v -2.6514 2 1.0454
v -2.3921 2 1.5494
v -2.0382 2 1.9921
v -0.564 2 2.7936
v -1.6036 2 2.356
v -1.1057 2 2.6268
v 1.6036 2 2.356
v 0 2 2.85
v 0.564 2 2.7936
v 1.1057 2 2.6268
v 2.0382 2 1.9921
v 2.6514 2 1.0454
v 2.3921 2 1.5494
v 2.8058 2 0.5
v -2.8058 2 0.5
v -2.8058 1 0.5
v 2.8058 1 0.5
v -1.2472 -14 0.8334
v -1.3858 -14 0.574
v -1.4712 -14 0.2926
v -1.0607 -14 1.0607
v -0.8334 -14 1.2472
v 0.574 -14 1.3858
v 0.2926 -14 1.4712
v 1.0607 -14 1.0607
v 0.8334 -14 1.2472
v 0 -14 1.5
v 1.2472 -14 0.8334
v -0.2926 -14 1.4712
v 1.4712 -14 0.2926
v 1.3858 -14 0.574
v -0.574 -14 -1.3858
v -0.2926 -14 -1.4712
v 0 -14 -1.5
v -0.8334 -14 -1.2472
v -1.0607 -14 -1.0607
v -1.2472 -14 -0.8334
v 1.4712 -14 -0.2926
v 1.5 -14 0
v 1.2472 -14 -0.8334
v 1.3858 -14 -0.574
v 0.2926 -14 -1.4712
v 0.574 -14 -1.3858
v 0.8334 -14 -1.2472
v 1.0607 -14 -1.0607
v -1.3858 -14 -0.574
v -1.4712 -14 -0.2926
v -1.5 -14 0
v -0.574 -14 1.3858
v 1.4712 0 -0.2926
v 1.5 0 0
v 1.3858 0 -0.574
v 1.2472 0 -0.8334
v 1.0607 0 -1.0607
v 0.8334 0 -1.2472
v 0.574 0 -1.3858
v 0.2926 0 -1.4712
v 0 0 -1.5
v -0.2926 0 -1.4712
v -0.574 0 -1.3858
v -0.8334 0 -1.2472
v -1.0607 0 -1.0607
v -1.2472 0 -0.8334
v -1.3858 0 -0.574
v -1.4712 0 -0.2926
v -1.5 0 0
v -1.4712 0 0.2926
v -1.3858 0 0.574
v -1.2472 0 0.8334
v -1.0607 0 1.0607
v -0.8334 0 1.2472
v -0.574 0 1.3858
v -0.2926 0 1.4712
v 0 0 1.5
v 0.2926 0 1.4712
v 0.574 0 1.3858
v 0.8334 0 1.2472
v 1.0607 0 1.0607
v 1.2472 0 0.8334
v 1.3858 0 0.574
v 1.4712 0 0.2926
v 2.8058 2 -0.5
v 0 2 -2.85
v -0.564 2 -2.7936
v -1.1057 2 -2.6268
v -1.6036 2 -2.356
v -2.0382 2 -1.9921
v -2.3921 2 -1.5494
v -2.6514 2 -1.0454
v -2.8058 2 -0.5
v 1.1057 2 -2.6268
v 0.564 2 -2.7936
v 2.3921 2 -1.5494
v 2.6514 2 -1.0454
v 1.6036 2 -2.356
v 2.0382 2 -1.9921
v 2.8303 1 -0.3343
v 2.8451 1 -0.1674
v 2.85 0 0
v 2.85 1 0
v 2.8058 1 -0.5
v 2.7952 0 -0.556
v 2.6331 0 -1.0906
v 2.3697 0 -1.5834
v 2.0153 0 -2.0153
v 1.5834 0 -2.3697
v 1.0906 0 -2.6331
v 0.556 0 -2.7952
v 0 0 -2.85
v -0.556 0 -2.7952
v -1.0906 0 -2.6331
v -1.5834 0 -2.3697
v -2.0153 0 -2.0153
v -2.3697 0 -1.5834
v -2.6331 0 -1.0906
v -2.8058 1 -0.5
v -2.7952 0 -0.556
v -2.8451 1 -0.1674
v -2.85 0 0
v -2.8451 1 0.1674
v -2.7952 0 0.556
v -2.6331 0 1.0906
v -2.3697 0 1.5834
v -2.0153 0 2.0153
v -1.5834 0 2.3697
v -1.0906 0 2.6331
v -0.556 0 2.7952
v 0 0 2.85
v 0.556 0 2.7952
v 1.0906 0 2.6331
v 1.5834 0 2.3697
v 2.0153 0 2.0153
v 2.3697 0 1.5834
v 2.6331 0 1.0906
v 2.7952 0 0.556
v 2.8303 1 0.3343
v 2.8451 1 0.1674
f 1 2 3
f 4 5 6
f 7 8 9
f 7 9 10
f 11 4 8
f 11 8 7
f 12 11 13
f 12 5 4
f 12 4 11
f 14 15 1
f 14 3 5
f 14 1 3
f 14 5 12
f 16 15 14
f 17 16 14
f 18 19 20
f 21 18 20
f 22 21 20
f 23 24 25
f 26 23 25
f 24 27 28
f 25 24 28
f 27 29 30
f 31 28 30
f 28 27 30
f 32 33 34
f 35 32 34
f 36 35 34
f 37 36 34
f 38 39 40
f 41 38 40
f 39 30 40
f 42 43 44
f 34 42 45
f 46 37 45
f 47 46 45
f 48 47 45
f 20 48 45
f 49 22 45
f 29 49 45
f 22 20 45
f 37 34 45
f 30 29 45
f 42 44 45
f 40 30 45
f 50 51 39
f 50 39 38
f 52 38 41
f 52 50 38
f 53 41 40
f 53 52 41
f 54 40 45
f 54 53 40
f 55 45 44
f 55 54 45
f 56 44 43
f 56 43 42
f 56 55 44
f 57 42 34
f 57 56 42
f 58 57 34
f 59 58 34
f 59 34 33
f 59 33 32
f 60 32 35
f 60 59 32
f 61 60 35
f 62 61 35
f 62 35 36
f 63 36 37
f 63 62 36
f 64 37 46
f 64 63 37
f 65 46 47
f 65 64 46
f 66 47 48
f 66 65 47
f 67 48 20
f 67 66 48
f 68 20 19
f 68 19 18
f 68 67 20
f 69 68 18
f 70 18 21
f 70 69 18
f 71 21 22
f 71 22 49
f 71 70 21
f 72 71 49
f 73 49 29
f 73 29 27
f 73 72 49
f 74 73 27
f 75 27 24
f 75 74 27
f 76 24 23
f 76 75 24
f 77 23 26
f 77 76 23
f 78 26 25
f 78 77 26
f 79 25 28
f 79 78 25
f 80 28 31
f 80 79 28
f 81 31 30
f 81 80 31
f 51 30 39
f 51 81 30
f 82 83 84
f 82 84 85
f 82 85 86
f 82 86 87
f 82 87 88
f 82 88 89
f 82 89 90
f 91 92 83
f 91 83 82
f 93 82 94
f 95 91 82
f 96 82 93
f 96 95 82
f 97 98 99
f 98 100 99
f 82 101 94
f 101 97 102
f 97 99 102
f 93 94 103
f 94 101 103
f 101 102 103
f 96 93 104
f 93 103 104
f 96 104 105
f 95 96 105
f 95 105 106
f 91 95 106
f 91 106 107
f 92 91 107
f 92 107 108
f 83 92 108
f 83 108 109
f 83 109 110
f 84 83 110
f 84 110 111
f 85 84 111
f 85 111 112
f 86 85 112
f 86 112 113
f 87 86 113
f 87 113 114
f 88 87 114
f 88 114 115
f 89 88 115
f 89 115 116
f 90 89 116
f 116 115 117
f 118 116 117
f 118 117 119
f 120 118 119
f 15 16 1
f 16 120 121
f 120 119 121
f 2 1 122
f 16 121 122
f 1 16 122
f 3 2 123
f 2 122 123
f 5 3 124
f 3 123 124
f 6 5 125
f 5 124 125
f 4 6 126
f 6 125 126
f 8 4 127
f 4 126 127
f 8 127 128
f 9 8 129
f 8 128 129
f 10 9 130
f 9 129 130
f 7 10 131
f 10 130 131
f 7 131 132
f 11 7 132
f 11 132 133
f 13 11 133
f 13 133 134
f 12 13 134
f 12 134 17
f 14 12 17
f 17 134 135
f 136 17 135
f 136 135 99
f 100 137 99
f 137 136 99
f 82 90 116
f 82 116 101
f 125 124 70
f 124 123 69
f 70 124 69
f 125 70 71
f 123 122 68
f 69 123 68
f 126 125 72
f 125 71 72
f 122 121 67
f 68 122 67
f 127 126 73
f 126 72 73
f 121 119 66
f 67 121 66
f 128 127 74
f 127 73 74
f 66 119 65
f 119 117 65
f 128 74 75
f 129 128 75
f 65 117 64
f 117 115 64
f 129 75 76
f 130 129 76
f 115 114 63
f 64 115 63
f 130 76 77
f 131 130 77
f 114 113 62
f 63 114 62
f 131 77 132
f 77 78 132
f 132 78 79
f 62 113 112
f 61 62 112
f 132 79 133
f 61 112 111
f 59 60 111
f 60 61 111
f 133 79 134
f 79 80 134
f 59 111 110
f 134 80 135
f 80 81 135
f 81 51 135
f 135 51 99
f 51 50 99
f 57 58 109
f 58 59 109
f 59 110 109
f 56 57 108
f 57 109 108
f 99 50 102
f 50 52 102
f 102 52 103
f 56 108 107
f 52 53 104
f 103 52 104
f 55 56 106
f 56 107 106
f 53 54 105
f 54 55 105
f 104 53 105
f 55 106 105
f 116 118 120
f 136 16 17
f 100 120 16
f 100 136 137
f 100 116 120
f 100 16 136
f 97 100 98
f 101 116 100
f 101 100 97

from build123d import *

# Parameters (mm, degrees)
SKETCH1_R           = 2.85
BOSS_EXTRUDE1_DEPTH = 2
SKETCH2_R           = 1.5
BOSS_EXTRUDE2_DEPTH = 14
SKETCH3_W           = 6
SKETCH3_H           = 1
CUT_EXTRUDE1_DEPTH  = 1


with BuildPart() as part:
    # Sketch1 → Boss-Extrude1 (new body)
    with BuildSketch(Plane(origin=(0, 0, 0), x_dir=(1, 0, 0), z_dir=(0, 1, 0))):
        Circle(SKETCH1_R)
    extrude(amount=BOSS_EXTRUDE1_DEPTH)

    # Sketch2 → Boss-Extrude2 (add)
    with BuildSketch(Plane(origin=(0, 0, 0), x_dir=(1, 0, 0), z_dir=(0, 1, 0))):
        Circle(SKETCH2_R)
    extrude(amount=-BOSS_EXTRUDE2_DEPTH)

    # Sketch3 → Cut-Extrude1 (cut)
    with BuildSketch(Plane(origin=(0, 2, 0), x_dir=(1, 0, 0), z_dir=(0, 1, 0))):
        Rectangle(SKETCH3_W, SKETCH3_H)
    extrude(amount=-CUT_EXTRUDE1_DEPTH, mode=Mode.SUBTRACT)


solid = part.part
